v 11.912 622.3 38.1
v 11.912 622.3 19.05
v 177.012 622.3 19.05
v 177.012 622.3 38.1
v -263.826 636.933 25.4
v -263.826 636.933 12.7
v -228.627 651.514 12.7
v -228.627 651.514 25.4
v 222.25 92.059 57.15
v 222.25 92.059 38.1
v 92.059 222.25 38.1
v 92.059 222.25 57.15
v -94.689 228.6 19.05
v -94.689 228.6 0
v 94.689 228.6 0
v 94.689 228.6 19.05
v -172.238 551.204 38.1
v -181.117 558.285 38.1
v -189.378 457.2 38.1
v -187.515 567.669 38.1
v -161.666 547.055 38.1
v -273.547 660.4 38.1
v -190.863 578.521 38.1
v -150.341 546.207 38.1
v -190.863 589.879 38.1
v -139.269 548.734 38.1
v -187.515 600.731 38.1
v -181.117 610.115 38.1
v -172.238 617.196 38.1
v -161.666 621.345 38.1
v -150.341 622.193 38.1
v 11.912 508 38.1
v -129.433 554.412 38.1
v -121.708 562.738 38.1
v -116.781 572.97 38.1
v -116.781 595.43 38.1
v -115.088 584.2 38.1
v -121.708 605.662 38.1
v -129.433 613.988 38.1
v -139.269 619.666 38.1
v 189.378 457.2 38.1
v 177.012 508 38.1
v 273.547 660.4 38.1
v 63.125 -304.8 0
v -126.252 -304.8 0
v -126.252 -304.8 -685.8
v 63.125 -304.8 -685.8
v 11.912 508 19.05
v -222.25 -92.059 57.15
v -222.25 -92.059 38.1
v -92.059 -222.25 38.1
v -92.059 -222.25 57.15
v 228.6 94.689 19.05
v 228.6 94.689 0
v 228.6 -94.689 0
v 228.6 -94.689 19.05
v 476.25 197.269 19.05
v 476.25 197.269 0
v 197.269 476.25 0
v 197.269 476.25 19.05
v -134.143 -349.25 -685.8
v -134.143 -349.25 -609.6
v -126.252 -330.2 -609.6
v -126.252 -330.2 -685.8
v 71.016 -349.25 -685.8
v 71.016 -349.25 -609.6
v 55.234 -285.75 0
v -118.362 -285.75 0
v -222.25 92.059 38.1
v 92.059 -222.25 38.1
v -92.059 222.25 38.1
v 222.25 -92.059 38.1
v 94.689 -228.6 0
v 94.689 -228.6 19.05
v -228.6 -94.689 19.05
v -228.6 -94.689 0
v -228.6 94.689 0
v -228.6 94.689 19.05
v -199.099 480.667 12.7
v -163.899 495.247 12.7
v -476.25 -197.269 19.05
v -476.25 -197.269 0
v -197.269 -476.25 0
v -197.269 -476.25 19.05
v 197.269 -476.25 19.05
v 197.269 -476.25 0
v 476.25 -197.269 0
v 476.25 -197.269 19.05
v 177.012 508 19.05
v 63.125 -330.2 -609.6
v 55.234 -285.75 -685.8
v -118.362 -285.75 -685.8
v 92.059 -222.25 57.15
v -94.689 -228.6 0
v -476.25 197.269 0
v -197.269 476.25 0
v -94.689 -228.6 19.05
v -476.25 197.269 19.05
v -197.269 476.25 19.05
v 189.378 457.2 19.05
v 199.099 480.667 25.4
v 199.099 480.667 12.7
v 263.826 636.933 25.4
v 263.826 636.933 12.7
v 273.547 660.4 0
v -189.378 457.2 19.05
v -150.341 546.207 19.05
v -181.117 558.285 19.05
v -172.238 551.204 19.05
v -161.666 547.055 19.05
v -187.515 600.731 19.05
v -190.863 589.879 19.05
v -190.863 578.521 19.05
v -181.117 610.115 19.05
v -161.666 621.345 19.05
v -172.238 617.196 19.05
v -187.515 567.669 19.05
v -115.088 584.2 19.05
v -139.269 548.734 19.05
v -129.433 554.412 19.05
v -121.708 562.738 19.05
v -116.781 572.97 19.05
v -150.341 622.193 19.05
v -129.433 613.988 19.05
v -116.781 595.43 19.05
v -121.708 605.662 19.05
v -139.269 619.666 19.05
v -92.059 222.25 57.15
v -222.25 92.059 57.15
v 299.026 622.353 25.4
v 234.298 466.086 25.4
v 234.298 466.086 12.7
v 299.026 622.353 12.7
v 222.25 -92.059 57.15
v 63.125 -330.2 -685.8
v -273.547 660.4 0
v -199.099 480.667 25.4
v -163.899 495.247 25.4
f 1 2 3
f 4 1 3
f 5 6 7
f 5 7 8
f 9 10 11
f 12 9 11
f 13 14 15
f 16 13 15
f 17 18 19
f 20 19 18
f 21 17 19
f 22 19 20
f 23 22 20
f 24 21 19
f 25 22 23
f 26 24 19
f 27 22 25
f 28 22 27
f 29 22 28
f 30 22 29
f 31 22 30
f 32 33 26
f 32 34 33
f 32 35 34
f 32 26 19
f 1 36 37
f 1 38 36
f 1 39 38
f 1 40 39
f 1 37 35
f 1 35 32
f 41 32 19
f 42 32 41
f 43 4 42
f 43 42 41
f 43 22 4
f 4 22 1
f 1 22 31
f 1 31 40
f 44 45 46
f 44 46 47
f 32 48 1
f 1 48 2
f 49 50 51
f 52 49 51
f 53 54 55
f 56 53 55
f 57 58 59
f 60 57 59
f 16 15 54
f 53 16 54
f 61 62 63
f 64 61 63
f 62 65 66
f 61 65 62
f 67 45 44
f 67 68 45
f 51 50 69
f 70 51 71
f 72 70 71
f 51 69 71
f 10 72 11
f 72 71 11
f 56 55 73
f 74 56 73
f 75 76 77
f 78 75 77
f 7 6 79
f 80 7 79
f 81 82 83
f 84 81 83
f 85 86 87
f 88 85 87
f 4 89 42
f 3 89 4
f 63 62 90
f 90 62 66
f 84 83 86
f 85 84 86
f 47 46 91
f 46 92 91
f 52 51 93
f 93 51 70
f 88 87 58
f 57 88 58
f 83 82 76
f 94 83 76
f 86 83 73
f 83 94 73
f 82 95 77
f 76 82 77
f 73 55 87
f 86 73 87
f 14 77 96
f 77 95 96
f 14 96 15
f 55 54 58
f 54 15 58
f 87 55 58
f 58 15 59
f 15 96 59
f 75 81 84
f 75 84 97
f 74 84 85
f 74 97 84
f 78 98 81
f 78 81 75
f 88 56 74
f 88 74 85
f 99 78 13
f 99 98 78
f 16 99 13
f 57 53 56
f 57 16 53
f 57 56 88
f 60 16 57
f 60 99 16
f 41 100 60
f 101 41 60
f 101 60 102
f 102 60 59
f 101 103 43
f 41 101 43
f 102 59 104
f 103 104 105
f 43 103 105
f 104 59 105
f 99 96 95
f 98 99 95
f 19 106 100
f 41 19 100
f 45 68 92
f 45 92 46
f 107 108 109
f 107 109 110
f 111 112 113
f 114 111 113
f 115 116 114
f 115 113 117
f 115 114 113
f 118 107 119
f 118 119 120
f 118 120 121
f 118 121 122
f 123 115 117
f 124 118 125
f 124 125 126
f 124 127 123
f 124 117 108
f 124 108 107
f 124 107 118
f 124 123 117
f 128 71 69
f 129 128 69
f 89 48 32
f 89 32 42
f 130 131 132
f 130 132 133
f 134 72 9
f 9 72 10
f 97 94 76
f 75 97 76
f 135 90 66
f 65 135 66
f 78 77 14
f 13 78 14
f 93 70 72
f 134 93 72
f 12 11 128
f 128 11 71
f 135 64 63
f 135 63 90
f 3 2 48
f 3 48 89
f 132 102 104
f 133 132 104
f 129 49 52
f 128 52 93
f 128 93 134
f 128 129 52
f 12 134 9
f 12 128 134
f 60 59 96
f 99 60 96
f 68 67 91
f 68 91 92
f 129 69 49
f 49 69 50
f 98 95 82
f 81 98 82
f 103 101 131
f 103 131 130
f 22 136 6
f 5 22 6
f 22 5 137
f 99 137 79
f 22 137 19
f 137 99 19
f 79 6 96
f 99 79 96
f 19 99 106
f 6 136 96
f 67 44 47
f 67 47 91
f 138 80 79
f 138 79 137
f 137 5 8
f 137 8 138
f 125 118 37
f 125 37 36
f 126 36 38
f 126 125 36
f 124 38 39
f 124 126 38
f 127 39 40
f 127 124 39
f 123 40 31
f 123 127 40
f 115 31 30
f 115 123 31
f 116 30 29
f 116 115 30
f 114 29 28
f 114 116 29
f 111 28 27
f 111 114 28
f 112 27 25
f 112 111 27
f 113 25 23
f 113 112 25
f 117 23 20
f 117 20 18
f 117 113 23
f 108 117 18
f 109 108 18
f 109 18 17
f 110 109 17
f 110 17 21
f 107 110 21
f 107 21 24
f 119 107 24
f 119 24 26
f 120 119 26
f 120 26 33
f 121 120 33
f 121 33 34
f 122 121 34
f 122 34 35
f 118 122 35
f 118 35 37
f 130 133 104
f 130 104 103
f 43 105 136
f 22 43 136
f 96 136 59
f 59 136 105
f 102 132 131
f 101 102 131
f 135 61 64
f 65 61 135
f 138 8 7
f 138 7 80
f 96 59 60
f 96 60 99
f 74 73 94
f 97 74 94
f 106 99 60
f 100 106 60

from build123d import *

# Parameters (mm, degrees)
F0_R      = 38.1
F0_W      = 165.1
F0_H      = 114.3
F1_DEPTH  = 38.1
F2_W      = 169.1420950994
F2_H      = 12.7
F3_DEPTH  = 38.1
F4_W      = 169.1420950994
F4_H      = 12.7
F5_DEPTH  = 38.1
F7_DEPTH  = 19.05
F9_DEPTH  = 19.05
F11_DEPTH = 685.8
F13_DEPTH = 19.05
F15_DEPTH = 76.2
F16_DEPTH = 19.05


with BuildPart() as f1:
    # F0 (on Top) → F1 (new body)
    with BuildSketch(Plane.XY):
        Polygon((273.5466365912, 660.4), (-273.5466365912, 660.4), (-189.378440717, 457.2), (189.378440717, 457.2), align=None)
        with Locations((-153.188152504, 584.2)):
            Circle(F0_R, mode=Mode.SUBTRACT)
        with Locations((94.461847496, 565.15)):
            Rectangle(F0_W, F0_H, mode=Mode.SUBTRACT)
    extrude(amount=F1_DEPTH)

    # F2 (on face) → F3 (cut)
    with BuildSketch(Plane(origin=(0, 0, 0), x_dir=(0.3826834324, -0.9238795325, 0), z_dir=(-0.9238795325, -0.3826834324, 0))):
        with Locations((-604.8407615234, 19.05)):
            Rectangle(F2_W, F2_H)
    extrude(amount=-F3_DEPTH, mode=Mode.SUBTRACT)

    # F4 (on face) → F5 (join)
    with BuildSketch(Plane(origin=(0, 0, 0), x_dir=(0.3826834324, 0.9238795325, 0), z_dir=(0.9238795325, -0.3826834324, 0))):
        with Locations((604.8407615234, 19.05)):
            Rectangle(F4_W, F4_H)
    extrude(amount=F5_DEPTH)

    # F6 (on face) → F7 (cut)
    with BuildSketch(Plane.XY):
        Polygon((-197.2692090802, 476.25), (-189.378440717, 457.2), (189.378440717, 457.2), (197.2692090802, 476.25), align=None)
    extrude(amount=F7_DEPTH, mode=Mode.SUBTRACT)

    # F0 (on Top) → F16 (join)
    with BuildSketch(Plane.XY):
        with Locations((-153.188152504, 584.2)):
            Circle(F0_R)
        with Locations((94.461847496, 565.15)):
            Rectangle(F0_W, F0_H)
    extrude(amount=F16_DEPTH)


with BuildPart() as f9:
    # F8 (on Top) → F9 (new body)
    with BuildSketch(Plane.XY):
        Polygon((-197.2692090802, -476.25), (197.2692090802, -476.25), (476.25, -197.2692090802), (476.25, 197.2692090802), (197.2692090802, 476.25), (-197.2692090802, 476.25), (-476.25, 197.2692090802), (-476.25, -197.2692090802), align=None)
        Polygon((228.6, -94.6892203585), (94.6892203585, -228.6), (-94.6892203585, -228.6), (-228.6, -94.6892203585), (-228.6, 94.6892203585), (-94.6892203585, 228.6), (94.6892203585, 228.6), (228.6, 94.6892203585), align=None, mode=Mode.SUBTRACT)
    extrude(amount=F9_DEPTH)


with BuildPart() as f11:
    # F10 (on Top) → F11 (new body)
    with BuildSketch(Plane.XY):
        Polygon((-126.2522938113, -304.8), (63.1250261887, -304.8), (55.2342578255, -285.75), (-118.3615254481, -285.75), align=None)
    extrude(amount=-F11_DEPTH)


with BuildPart() as f13:
    # F12 (on face) → F13 (new body)
    with BuildSketch(Plane.XY.offset(38.1)):
        Polygon((-92.0589642374, -222.25), (92.0589642374, -222.25), (222.25, -92.0589642374), (222.25, 92.0589642374), (92.0589642374, 222.25), (-92.0589642374, 222.25), (-222.25, 92.0589642374), (-222.25, -92.0589642374), align=None)
    extrude(amount=F13_DEPTH)


with BuildPart() as f15:
    # F14 (on face) → F15 (new body)
    with BuildSketch(Plane(origin=(0, 0, -685.8), x_dir=(1, 0, 0), z_dir=(0, 0, -1))):
        Polygon((-134.1430621745, 349.25), (-126.2522938113, 330.2), (63.1250261887, 330.2), (71.0157945519, 349.25), align=None)
    extrude(amount=-F15_DEPTH)


solid = Compound([f1.part, f9.part, f11.part, f13.part, f15.part])
